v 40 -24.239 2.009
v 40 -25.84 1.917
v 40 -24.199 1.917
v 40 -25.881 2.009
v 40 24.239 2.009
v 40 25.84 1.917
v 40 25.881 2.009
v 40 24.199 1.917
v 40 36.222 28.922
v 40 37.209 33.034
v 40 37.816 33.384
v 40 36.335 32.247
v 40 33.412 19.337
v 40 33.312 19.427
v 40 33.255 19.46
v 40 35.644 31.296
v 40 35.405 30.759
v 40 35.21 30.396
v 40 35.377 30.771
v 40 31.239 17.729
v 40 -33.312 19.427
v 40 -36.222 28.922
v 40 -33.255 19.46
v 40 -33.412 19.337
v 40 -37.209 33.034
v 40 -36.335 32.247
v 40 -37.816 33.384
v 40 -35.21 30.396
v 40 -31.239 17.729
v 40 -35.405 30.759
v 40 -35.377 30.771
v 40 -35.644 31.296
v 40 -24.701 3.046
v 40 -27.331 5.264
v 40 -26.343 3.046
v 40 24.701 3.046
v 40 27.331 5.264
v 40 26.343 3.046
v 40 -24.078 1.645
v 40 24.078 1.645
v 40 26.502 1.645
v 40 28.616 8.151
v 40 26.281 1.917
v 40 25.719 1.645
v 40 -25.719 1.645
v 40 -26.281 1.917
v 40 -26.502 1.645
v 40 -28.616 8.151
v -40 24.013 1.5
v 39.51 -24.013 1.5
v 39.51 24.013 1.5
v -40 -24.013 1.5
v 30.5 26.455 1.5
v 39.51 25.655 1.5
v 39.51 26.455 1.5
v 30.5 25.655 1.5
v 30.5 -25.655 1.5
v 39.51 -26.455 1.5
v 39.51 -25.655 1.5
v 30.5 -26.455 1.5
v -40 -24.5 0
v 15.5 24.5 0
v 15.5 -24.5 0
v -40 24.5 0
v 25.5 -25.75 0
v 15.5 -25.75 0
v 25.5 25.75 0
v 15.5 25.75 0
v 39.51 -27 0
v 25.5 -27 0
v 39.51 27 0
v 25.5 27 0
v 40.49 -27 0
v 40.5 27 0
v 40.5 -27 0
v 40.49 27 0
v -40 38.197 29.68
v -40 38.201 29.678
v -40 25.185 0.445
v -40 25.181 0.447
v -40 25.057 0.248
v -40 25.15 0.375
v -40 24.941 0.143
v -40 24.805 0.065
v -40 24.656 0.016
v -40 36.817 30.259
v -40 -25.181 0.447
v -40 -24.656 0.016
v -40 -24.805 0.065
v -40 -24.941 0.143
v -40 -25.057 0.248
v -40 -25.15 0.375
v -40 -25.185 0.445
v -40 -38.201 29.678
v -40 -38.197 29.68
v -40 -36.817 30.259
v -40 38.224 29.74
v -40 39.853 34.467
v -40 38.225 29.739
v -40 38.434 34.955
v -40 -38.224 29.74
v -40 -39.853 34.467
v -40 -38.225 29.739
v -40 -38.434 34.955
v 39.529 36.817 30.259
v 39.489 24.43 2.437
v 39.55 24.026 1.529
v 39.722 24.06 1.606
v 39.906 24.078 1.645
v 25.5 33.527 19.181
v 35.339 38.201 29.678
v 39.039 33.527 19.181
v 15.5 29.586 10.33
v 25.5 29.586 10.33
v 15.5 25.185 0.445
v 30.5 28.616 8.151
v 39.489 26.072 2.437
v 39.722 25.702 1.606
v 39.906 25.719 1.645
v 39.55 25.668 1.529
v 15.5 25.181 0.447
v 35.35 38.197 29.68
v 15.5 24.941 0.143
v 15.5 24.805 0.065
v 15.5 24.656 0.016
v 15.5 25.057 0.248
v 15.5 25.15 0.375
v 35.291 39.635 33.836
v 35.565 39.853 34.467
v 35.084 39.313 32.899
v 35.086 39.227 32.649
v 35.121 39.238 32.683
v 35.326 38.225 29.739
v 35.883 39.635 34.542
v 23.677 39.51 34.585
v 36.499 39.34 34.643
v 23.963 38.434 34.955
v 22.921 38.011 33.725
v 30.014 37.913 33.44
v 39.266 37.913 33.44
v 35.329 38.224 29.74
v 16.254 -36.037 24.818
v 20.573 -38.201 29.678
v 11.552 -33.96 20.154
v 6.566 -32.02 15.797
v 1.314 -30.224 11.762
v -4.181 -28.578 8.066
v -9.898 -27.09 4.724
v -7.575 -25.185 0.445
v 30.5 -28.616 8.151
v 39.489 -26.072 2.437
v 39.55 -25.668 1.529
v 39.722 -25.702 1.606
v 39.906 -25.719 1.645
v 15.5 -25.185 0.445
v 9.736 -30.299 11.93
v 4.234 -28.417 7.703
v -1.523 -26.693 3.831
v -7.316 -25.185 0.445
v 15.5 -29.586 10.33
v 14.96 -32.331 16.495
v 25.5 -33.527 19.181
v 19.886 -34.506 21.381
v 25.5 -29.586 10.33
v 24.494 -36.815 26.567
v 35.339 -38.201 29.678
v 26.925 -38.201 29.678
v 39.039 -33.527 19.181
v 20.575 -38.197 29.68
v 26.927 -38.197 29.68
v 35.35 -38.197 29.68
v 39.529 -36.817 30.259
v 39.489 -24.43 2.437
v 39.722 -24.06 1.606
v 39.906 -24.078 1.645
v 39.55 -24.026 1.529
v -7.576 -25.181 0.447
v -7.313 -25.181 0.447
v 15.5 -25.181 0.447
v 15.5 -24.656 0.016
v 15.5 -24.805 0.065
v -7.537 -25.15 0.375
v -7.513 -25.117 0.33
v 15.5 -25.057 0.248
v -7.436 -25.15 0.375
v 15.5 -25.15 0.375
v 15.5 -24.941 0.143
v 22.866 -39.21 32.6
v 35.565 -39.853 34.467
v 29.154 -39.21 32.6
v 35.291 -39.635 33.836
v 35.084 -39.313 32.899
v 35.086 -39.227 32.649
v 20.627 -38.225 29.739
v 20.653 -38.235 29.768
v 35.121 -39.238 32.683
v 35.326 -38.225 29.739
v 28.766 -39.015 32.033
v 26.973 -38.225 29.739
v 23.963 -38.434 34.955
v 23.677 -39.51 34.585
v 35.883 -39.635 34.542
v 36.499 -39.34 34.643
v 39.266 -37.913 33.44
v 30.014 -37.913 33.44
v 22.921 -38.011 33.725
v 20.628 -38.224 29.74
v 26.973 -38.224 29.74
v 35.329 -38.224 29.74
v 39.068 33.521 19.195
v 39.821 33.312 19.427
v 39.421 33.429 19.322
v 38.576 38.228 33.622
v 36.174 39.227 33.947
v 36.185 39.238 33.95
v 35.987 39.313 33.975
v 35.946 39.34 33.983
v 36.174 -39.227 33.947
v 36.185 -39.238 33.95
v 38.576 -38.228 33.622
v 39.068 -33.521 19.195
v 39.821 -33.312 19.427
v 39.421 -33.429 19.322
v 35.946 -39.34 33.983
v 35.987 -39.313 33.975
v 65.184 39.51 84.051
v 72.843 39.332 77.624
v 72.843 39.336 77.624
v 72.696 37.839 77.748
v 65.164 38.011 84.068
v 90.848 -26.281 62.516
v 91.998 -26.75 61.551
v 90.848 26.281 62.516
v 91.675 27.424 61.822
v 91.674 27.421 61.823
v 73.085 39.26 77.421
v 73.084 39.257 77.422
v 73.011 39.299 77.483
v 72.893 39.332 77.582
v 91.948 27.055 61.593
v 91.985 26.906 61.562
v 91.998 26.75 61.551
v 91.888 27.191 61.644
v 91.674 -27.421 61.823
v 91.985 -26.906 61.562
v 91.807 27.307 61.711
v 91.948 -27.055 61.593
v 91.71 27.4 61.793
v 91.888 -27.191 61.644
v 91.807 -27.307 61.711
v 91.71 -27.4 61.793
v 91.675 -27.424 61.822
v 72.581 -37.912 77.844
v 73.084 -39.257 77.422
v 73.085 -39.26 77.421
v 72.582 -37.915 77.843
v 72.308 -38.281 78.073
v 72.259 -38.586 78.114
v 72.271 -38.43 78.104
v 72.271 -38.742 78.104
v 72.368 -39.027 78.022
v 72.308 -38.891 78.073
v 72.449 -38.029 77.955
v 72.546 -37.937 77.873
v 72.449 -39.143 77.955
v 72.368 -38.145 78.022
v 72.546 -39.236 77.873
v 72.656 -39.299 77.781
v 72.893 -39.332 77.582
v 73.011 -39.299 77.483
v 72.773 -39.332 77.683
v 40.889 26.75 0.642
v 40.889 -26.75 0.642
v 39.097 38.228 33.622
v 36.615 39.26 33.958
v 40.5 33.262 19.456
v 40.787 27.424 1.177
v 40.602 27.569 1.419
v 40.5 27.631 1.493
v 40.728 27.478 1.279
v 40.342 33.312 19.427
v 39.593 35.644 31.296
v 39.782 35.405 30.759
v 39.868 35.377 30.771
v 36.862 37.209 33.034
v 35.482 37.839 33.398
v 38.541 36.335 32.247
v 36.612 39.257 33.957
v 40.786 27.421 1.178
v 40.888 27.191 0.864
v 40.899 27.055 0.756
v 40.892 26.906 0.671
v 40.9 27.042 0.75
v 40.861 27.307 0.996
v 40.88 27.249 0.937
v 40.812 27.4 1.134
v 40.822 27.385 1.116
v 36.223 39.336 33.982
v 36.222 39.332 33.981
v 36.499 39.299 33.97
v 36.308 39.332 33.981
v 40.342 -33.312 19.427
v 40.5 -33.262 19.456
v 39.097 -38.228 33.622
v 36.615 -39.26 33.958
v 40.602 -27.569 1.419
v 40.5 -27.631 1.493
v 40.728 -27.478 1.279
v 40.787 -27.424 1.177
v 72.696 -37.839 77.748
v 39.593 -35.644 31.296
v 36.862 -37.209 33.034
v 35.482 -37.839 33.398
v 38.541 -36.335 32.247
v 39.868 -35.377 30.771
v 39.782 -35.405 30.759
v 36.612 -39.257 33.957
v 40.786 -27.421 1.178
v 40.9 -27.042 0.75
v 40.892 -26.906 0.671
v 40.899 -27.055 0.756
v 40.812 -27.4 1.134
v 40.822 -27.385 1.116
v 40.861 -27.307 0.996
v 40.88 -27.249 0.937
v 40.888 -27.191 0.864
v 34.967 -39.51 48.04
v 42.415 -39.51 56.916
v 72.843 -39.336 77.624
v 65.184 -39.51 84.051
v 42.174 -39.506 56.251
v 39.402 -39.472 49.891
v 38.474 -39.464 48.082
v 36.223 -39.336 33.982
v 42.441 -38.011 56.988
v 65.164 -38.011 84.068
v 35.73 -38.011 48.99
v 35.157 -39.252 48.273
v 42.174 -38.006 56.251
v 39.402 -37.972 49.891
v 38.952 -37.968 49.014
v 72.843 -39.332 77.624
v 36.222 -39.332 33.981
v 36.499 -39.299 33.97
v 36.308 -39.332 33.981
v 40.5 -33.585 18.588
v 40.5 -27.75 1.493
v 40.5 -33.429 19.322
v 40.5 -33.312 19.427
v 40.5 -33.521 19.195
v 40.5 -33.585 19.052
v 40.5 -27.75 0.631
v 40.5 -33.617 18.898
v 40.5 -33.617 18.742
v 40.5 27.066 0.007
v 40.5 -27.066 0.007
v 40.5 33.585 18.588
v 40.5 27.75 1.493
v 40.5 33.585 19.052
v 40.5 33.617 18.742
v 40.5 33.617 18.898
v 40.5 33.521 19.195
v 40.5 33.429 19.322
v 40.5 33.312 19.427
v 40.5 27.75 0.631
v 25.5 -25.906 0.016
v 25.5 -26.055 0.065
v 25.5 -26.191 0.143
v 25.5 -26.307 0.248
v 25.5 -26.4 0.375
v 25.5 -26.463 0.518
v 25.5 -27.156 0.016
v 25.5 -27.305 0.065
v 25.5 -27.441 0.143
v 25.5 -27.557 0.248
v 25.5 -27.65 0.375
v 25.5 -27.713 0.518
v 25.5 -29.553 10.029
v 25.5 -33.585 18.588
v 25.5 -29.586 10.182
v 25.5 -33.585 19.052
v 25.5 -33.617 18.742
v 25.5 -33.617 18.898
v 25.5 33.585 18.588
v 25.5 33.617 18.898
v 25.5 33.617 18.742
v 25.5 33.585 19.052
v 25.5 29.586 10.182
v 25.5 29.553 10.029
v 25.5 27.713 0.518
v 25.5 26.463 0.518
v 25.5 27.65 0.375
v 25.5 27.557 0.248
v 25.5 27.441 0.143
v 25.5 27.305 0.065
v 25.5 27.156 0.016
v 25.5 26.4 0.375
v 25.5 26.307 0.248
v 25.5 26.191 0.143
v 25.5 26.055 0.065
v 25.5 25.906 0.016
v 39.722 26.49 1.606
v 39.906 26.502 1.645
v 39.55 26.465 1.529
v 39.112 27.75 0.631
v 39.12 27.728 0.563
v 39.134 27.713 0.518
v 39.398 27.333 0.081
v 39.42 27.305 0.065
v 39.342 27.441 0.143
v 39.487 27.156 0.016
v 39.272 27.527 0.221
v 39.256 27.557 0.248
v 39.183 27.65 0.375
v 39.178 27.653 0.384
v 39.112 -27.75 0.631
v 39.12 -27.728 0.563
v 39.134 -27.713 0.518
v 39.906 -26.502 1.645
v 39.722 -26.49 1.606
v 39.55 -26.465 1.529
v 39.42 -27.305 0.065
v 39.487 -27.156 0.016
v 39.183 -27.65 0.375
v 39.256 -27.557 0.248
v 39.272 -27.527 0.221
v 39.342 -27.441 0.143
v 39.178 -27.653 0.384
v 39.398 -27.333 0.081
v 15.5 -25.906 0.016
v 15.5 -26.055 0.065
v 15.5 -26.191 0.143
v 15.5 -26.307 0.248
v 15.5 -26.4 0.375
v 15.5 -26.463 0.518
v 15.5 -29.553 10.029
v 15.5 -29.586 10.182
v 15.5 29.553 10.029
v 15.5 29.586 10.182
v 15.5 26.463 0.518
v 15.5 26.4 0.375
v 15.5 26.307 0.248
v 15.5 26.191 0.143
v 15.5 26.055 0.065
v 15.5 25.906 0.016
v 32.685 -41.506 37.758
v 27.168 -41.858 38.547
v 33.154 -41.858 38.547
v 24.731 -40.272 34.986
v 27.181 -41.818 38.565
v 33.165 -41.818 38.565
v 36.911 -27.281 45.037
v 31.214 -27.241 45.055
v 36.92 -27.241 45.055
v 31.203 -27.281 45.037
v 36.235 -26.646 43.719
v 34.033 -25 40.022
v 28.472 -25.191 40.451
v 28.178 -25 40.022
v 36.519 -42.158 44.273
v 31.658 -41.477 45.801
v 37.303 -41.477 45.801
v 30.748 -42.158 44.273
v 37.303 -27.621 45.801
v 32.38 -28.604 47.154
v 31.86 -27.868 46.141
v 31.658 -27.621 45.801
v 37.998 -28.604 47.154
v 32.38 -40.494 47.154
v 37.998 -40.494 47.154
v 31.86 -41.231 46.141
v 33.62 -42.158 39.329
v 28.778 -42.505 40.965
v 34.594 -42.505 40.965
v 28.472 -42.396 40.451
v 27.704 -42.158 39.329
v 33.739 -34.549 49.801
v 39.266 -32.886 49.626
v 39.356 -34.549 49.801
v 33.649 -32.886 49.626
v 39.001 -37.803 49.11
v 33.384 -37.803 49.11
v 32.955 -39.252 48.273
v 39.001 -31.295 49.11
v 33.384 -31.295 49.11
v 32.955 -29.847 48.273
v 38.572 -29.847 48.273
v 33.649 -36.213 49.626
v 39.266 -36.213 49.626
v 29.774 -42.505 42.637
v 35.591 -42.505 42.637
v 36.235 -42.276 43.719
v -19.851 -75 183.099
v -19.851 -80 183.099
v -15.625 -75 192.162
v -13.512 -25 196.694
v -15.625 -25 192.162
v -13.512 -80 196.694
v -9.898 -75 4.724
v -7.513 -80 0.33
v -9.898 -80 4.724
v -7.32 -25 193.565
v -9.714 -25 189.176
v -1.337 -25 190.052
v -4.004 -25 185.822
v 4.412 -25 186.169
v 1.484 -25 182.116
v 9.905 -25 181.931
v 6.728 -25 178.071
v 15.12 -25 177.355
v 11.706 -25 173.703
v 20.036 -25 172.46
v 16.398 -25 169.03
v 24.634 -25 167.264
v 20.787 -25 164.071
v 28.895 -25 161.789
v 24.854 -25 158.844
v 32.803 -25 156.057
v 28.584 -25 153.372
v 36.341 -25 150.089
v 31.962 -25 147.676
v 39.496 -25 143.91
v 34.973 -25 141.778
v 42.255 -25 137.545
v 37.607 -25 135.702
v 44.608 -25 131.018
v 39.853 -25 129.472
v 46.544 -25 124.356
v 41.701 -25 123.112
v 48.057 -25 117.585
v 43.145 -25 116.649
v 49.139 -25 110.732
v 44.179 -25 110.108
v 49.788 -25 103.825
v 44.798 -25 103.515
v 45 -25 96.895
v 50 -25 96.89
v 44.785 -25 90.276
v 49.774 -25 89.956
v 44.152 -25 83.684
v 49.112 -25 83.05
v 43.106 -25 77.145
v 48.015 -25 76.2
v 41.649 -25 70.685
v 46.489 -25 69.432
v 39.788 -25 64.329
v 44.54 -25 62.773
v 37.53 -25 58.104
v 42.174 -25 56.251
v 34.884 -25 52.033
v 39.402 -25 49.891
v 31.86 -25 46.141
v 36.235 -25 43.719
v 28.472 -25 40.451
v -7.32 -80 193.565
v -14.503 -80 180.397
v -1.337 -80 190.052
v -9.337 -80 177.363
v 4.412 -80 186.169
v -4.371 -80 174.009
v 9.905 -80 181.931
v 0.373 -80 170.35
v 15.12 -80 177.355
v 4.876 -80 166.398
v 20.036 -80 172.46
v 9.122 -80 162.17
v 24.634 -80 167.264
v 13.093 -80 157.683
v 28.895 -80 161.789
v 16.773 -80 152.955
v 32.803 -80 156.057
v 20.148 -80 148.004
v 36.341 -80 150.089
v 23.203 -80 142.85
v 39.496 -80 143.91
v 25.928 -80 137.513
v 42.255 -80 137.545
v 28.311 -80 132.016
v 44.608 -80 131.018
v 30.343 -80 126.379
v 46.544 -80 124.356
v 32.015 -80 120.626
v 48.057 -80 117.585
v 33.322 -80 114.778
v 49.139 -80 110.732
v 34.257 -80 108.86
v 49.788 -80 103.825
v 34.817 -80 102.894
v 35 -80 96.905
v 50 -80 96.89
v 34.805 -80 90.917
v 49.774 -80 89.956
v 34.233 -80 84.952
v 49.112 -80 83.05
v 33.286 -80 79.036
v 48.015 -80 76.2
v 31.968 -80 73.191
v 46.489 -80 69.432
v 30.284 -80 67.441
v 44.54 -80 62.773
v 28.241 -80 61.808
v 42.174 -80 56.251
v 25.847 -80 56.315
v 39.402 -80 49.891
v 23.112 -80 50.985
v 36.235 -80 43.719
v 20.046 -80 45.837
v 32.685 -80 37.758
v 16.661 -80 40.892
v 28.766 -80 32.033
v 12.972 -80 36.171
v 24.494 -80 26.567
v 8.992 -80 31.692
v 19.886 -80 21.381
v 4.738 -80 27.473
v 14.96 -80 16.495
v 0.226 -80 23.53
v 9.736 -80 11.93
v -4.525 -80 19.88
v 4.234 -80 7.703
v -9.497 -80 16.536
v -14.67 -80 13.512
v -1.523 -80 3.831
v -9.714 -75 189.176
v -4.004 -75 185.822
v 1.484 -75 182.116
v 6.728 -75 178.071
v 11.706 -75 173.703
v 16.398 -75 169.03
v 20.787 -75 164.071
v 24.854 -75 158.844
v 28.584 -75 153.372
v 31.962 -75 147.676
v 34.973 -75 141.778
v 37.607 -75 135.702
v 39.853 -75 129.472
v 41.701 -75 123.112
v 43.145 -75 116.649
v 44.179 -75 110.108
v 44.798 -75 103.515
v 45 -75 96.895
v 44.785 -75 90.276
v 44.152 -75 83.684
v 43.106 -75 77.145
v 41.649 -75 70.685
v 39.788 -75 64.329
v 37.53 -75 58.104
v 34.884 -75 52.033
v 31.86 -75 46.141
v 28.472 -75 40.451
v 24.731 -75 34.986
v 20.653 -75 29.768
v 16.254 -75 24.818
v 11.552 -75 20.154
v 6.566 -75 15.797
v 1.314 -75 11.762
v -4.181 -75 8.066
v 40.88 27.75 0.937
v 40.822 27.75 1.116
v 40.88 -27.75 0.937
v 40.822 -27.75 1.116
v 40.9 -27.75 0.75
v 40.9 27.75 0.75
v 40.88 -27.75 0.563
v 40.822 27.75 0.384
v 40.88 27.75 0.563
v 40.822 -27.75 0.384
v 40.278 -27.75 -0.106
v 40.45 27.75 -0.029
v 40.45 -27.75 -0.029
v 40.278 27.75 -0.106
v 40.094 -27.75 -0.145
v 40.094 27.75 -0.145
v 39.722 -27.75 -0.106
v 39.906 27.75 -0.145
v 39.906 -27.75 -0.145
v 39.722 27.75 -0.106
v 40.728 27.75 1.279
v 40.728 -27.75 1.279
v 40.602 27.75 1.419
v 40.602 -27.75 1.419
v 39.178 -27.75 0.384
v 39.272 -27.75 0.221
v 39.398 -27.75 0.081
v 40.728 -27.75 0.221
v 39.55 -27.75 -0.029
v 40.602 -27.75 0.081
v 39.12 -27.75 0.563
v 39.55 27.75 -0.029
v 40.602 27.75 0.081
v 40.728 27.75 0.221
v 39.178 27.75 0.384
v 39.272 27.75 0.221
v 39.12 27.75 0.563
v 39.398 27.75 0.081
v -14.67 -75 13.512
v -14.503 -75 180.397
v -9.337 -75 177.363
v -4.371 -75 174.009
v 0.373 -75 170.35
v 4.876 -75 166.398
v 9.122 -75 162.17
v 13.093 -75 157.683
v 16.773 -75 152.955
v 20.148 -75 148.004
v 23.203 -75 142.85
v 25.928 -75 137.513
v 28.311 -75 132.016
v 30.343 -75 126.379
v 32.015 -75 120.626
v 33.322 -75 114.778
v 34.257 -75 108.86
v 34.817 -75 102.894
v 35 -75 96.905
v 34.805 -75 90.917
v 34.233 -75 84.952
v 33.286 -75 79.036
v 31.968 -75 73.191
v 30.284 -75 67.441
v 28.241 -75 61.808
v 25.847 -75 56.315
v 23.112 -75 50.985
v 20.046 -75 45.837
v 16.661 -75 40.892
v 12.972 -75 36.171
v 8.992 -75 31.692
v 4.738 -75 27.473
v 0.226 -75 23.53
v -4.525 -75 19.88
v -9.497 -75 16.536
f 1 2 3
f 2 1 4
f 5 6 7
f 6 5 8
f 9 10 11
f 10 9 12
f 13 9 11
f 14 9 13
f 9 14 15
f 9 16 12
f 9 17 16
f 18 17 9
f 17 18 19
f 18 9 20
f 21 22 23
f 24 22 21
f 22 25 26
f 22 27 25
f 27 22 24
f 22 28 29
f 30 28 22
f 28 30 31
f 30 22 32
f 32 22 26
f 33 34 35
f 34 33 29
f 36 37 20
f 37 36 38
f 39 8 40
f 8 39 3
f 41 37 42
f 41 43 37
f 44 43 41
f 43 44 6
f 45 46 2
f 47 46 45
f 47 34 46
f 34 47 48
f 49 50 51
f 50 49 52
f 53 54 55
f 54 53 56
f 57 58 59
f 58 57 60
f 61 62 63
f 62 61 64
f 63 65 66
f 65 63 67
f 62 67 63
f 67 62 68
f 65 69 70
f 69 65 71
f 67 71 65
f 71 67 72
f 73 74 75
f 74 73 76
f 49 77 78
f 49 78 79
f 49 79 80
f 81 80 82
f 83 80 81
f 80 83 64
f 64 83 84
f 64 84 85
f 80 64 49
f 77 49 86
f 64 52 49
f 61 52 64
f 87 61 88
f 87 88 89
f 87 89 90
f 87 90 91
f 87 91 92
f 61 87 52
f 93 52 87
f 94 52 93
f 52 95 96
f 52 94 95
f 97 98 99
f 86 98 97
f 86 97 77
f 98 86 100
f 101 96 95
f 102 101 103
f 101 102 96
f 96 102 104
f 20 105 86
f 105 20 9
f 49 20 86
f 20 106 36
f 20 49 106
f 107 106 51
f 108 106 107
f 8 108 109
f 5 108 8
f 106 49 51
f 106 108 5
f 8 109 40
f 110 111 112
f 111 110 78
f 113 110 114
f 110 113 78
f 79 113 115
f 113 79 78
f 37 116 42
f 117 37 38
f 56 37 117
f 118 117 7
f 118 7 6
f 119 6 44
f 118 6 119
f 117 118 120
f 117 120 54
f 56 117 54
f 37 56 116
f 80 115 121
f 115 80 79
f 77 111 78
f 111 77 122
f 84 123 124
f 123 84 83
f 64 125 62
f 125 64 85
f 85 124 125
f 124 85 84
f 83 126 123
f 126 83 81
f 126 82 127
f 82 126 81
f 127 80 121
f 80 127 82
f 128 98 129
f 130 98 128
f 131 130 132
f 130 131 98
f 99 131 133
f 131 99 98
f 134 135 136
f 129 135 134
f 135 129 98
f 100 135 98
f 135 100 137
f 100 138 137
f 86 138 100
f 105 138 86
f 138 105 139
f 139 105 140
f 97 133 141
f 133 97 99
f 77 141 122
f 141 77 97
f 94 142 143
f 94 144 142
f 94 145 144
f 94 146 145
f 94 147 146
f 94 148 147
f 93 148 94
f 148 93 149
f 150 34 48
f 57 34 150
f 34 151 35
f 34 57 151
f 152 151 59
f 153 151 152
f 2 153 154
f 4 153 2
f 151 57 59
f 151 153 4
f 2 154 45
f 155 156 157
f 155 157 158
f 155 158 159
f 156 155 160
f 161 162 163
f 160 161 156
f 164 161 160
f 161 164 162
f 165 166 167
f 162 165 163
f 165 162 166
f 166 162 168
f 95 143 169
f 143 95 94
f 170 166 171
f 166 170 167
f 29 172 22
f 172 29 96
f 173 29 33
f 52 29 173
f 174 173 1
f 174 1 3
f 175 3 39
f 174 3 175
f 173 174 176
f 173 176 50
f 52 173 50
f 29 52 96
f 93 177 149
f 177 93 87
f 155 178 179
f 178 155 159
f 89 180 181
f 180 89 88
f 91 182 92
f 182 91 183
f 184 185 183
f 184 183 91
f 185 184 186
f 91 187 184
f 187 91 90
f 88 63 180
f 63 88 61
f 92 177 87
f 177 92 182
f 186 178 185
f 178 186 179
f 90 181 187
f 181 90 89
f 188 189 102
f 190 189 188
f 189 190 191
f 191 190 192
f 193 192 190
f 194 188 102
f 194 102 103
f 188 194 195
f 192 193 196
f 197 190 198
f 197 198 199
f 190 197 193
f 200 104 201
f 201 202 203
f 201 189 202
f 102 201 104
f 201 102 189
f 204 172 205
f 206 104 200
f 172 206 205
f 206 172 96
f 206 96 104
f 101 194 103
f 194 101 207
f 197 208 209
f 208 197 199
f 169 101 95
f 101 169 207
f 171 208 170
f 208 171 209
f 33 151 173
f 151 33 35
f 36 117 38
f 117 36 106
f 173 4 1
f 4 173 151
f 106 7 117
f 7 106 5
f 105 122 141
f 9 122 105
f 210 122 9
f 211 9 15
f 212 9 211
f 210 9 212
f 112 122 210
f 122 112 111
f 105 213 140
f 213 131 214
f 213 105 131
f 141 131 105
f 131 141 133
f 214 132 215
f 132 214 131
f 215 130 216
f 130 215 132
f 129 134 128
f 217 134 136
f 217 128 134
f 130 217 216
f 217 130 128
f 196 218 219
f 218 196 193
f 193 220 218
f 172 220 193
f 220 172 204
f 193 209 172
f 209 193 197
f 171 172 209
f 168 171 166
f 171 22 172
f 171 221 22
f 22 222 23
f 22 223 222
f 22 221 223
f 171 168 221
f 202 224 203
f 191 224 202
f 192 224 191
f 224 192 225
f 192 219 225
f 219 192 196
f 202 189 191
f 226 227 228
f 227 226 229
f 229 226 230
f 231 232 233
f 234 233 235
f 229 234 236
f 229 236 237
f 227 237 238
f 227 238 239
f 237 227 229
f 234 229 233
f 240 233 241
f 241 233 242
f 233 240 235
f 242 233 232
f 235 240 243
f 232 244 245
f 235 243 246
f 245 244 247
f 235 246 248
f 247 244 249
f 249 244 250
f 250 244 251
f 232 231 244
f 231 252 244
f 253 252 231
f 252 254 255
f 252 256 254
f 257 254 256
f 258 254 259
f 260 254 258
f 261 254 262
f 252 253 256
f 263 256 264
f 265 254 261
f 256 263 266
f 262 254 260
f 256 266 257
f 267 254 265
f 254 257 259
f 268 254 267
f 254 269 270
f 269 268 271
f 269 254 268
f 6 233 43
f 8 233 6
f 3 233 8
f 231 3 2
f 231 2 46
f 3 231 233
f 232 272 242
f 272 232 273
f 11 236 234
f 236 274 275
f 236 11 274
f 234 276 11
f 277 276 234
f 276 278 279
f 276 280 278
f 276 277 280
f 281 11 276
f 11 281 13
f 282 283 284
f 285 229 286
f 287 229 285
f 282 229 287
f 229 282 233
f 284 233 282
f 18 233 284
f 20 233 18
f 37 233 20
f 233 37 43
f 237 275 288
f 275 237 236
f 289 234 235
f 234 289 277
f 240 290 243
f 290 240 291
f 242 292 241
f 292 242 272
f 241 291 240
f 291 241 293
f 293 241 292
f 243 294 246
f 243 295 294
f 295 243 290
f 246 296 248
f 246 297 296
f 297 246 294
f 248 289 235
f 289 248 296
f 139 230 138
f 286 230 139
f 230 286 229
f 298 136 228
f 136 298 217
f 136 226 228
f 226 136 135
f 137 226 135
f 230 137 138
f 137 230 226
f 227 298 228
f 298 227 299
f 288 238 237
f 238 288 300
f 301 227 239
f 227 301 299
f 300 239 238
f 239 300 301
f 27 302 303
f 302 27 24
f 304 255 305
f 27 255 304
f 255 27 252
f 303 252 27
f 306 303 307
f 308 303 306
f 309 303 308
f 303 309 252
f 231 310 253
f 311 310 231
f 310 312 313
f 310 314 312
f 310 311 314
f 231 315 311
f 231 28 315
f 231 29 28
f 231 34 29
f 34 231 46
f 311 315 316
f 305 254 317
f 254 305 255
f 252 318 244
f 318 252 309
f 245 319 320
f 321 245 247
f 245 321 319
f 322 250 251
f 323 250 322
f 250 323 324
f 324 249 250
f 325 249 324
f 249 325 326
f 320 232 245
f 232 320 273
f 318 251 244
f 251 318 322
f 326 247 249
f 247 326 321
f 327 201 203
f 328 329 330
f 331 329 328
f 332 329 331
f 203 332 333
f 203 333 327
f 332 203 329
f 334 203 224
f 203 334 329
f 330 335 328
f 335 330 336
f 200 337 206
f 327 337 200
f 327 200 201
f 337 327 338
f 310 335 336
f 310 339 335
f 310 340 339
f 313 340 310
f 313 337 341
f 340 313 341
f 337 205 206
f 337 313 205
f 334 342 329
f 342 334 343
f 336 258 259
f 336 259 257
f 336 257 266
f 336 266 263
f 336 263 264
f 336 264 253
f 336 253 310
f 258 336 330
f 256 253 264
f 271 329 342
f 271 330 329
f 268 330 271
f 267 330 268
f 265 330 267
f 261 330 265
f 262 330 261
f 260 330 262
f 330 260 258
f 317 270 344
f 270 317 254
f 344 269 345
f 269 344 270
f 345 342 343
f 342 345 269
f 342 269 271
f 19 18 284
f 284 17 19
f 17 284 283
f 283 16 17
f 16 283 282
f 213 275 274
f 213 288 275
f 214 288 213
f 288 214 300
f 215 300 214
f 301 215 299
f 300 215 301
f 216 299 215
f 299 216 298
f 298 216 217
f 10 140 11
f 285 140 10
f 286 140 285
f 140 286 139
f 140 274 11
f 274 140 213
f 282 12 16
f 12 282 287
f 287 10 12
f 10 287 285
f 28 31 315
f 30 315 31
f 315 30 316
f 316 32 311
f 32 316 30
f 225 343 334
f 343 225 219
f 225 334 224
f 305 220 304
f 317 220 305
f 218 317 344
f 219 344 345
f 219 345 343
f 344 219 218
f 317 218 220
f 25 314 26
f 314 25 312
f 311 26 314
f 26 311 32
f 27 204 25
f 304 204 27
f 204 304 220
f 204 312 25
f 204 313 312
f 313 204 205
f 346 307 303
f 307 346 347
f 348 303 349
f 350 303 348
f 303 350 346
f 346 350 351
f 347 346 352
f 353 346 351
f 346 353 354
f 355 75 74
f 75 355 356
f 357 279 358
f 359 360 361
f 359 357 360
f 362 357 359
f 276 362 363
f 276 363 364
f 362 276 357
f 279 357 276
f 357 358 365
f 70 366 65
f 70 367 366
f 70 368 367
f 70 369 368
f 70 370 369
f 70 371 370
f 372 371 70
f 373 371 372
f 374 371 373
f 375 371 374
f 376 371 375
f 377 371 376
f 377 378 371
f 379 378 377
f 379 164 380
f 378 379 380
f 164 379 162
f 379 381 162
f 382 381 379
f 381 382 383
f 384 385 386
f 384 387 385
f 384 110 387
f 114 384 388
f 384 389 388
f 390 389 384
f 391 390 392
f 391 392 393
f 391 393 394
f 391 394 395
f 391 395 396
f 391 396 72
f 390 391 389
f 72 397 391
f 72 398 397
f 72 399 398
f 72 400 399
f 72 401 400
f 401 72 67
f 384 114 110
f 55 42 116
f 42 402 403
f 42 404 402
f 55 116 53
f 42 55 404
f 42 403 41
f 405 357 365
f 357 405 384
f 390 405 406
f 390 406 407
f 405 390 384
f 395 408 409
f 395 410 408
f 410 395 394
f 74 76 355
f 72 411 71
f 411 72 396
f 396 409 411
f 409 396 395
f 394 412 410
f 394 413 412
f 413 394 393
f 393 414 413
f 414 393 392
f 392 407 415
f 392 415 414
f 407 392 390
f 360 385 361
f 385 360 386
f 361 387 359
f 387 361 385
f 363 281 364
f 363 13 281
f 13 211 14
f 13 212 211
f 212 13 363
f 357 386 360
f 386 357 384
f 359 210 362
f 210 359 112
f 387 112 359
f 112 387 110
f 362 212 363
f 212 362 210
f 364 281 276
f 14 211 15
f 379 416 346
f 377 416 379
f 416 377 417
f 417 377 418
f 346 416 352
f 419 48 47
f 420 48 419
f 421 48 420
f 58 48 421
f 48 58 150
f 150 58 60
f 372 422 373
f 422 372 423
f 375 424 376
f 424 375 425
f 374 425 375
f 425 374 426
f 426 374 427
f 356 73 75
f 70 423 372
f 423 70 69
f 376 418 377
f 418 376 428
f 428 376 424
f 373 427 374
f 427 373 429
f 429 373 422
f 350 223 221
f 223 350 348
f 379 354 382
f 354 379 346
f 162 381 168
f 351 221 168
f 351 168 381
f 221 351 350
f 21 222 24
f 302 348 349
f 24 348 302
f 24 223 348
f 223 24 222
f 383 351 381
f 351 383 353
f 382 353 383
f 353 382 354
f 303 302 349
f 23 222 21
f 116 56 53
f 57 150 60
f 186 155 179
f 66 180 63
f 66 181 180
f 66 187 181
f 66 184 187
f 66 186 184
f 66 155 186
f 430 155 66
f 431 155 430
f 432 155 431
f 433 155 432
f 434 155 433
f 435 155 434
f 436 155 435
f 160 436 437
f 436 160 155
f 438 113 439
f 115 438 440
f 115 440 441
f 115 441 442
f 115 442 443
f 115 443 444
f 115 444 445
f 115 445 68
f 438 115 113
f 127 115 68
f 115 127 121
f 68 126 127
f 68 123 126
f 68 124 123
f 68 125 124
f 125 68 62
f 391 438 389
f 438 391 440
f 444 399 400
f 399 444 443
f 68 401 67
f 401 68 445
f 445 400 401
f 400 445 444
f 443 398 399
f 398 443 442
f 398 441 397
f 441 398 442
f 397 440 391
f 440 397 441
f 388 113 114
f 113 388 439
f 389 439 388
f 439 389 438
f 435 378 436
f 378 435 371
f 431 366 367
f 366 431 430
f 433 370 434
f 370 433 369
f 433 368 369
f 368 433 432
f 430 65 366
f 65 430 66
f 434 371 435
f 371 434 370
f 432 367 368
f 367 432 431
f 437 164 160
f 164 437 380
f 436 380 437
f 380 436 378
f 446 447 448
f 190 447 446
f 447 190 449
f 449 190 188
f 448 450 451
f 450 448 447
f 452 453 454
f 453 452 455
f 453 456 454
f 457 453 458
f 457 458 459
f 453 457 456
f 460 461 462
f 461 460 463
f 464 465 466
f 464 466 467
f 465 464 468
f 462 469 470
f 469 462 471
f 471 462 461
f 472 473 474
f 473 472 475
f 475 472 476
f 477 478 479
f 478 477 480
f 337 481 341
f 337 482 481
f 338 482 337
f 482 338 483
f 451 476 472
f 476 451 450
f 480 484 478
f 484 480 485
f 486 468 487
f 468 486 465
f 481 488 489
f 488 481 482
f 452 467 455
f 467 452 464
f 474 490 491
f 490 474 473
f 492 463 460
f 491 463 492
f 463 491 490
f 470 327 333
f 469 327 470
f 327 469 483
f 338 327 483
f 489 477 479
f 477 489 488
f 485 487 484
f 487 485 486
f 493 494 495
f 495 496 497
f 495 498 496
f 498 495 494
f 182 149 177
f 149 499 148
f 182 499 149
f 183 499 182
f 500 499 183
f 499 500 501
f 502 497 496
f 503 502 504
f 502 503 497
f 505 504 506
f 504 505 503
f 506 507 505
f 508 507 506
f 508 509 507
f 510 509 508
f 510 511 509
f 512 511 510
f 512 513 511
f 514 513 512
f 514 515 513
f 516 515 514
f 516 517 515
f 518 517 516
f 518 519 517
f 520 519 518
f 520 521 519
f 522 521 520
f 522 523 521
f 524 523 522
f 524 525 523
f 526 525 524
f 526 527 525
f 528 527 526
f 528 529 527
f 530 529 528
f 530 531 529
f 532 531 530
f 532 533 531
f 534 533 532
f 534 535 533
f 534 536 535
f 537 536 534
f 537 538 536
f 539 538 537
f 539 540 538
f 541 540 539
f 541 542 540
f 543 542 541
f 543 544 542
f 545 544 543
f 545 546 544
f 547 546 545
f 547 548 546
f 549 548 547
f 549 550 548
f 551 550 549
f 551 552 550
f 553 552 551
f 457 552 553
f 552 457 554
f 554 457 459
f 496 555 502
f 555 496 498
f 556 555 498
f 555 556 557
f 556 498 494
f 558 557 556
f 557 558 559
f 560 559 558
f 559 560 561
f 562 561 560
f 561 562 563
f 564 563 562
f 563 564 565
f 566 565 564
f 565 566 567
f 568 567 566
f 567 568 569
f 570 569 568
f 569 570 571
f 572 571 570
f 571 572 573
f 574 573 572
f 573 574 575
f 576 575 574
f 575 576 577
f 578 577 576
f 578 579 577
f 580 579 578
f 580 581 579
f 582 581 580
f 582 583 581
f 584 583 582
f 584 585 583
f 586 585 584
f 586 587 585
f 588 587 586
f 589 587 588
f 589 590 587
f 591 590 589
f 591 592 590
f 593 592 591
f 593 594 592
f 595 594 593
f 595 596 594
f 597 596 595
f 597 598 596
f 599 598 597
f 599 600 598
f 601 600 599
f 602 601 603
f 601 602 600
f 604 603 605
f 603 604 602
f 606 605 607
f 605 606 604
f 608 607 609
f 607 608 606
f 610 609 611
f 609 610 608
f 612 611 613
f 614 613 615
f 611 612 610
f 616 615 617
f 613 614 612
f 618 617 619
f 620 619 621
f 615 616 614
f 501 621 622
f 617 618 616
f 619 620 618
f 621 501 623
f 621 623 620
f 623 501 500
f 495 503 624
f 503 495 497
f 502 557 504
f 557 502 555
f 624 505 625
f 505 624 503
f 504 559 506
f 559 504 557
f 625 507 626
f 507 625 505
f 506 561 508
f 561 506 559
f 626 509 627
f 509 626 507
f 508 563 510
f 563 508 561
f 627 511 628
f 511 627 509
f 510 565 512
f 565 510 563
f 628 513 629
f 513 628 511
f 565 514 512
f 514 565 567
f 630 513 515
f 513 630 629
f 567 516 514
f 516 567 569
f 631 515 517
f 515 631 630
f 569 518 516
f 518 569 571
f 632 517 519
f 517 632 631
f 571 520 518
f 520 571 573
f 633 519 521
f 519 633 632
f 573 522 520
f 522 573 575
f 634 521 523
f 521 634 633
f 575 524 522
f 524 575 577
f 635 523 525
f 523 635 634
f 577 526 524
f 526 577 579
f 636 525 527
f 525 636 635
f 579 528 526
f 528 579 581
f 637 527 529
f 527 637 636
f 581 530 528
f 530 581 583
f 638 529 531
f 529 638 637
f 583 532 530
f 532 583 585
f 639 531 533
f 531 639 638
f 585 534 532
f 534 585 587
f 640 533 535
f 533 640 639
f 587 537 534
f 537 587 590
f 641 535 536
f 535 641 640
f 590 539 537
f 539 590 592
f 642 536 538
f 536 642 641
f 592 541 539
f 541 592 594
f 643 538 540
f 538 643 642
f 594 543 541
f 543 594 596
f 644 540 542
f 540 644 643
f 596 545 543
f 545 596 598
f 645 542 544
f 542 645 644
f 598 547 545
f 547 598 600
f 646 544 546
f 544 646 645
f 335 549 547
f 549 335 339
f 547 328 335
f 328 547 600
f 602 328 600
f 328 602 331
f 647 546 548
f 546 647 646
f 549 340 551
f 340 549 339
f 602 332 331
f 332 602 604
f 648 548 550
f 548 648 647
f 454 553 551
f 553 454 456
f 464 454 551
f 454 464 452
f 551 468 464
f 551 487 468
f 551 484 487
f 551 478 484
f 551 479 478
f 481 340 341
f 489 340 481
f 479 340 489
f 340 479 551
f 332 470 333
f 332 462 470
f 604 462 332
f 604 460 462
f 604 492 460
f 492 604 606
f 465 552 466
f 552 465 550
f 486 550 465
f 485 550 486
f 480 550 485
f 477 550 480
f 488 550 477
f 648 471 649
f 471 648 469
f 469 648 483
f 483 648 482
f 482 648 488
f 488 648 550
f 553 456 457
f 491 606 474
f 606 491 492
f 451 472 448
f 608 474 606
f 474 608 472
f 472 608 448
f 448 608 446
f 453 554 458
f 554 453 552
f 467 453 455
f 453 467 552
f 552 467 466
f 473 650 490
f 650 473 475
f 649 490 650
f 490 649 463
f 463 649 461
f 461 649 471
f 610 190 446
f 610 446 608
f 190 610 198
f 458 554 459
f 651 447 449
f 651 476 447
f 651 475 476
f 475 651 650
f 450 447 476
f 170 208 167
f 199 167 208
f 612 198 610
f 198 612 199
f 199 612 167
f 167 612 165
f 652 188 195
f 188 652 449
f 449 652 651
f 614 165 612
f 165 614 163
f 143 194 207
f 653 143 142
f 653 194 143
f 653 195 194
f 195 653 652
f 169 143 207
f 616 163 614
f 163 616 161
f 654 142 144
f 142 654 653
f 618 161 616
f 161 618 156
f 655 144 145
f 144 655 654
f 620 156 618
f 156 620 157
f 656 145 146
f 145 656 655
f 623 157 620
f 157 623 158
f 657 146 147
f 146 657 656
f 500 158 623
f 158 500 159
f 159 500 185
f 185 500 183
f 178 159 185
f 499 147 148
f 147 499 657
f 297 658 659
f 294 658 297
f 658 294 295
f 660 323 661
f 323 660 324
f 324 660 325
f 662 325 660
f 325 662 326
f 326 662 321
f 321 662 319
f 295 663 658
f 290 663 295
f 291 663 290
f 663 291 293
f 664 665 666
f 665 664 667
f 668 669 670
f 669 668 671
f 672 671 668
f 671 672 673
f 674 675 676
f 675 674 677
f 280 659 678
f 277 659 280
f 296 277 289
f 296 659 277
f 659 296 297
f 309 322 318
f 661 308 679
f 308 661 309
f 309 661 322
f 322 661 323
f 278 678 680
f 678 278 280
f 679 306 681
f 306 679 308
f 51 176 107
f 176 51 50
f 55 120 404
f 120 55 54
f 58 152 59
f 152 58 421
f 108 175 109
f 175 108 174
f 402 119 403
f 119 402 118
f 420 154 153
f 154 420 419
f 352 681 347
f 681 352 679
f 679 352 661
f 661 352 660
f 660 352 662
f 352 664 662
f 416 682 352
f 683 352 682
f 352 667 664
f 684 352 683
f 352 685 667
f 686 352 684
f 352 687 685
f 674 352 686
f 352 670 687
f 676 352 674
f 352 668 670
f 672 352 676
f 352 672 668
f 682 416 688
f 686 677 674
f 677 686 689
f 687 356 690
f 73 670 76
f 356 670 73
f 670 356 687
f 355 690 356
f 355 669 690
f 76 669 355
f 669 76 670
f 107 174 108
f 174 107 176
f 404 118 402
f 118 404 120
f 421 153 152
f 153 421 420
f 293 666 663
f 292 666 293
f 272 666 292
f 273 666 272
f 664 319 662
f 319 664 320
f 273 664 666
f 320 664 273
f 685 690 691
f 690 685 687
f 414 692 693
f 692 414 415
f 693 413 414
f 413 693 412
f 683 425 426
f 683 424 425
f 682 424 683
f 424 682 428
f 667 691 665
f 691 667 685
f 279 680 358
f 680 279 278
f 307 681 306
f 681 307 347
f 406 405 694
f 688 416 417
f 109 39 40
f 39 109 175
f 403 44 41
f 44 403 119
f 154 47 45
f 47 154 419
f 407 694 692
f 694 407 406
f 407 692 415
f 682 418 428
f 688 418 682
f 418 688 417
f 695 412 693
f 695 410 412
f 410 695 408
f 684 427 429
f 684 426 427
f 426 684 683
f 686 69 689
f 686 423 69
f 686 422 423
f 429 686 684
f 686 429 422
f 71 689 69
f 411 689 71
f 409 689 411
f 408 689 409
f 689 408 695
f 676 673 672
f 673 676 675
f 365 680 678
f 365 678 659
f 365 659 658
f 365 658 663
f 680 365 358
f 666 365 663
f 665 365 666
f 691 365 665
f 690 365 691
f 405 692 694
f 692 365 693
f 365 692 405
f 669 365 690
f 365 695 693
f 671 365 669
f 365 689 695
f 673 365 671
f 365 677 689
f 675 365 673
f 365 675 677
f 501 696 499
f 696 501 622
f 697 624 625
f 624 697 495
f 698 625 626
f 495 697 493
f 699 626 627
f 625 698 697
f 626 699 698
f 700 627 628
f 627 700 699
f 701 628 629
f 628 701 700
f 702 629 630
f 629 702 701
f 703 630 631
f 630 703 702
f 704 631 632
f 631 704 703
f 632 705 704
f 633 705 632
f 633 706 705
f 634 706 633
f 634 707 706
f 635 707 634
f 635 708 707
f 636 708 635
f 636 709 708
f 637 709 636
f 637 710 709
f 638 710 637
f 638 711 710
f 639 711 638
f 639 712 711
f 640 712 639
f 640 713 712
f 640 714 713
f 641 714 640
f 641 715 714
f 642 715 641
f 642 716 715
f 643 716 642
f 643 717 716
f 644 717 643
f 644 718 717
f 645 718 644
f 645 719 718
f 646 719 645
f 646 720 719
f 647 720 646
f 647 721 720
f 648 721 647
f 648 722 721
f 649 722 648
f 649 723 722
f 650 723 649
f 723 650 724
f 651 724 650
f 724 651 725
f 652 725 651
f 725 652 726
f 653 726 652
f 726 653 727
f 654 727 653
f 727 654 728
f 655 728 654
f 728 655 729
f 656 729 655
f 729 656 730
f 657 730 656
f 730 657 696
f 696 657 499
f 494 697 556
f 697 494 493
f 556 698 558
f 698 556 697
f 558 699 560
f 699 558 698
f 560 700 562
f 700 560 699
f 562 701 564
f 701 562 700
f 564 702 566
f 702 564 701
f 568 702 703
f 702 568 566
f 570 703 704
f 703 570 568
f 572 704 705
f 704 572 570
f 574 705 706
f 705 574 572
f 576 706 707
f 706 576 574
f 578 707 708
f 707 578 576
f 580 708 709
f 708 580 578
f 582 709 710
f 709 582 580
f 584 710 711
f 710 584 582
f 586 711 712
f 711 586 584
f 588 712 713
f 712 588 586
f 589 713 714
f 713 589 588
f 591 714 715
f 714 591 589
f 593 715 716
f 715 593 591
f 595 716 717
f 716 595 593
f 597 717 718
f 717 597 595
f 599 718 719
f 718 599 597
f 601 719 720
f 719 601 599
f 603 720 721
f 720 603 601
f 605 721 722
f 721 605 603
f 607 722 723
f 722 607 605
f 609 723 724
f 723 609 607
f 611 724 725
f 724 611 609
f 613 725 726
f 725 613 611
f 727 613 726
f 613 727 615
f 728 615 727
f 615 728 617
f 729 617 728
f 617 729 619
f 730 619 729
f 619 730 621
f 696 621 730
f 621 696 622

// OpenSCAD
$fn=30;
//$thickness = 1;
//sphere(3);

module ushape (length,width,angle,sidelength,thickness,hooklength,hookangle) {
  cube([length,width,thickness],center=true);
  // Sidewall 1
  translate([-(length/2),(width/2),0]) {
    rotate(a=angle , v = [1,0,0]) {
      translate ([0,0,-thickness/2]) { 
        cube([length,sidelength,thickness]);
      }
    }
  }
  // Edge smooth1
  translate ([0,(width/2),0]) { 
    rotate (a=90,v=[0,1,0]) {
      cylinder(h=length,center=true,d=thickness);
    }
  }
  // Hook 1
  translate([-(length/2),width/2+sidelength*(cos(angle)),sidelength*sin(angle)]) {
    rotate(a=angle+hookangle, v = [1,0,0]) {
      translate ([0,0,-thickness/2]) { 
        cube([length,hooklength,thickness]);
      }
    }
  }
  // Hook 1 smooth 
  translate ([0,(width/2)+sidelength*(cos(angle)),sidelength*sin(angle)]) { 
    rotate (a=90,v=[0,1,0]) {
      cylinder(h=length,center=true,d=thickness);
    }
  }
  // Sidewall 2 
  translate([-(length/2),-(width/2),0]) {
    rotate(a=180-angle , v = [1,0,0]) {
      translate ([0,0,-thickness/2]) { 
        cube([length,sidelength,thickness]);
      }
    }
  }
  // Edge smooth 2 
  translate ([0,-(width/2),0]) { 
    rotate (a=90,v=[0,1,0]) {
      cylinder(h=length,center=true,d=thickness);
    }
  }
  // Hook 2
  translate([-(length/2),-width/2-sidelength*(cos(angle)),sidelength*sin(angle)]) {
    rotate(a=180-(angle+hookangle), v = [1,0,0]) {
      translate ([0,0,-thickness/2]) { 
        cube([length,hooklength,thickness]);
      }
    }
  }
  // Hook 2 smooth 
  translate ([0,-(width/2)-sidelength*(cos(angle)),sidelength*sin(angle)]) { 
    rotate (a=90,v=[0,1,0]) {
      cylinder(h=length,center=true,d=thickness);
    }
  }
}

// Params
// length = length of base plate along x axis
// width  = width of base plate along y axis
// angle  = angle of sidewalls from y axis and left 
// sidelength = length of the two sides of the U-profile
// hooklength = length of the hook at the end of the sides
// hookangle = angle of hook relative to sidewalls 

// Prøveprint 1 
// Ramma
//ushape(10,51,80,49,1,2,90);

//translate([5,0,0,]) {
//rotate (a=20, v=[0,1,0]) { 
//  translate ([5,0,0]) { 
    // Motorskjold
//    ushape(10,58,64,40,1,0,90);
//  }
//}
//}

base_length=80;
front_length=80;
base_sidewall_angle=66;
front_sidewall_angle=64;
up_angle=50;
base_width=49;
front_width=53.5;
base_wall_height=32;
front_wall_height=27;
thickness=1.5;

  difference() {
      translate ([0,0,thickness/2]) {  
      ushape(base_length,base_width,base_sidewall_angle,base_wall_height,thickness,5,5);
    }

    translate ([front_length/2+thickness,0,thickness/2]) {  
       rotate(a=-up_angle, v=[0,1,0]) {
         translate([front_length/2,0,0]) {
           ushape(front_length,front_width+(4*thickness),front_sidewall_angle,front_wall_height,thickness*3.5,0,0);
         } 
       }
     }
     
  }

  difference() { 
    translate ([base_length/2,0,thickness/2]) {  
      rotate(a=-up_angle, v=[0,1,0]) {
        translate([front_length/2,0,0]) {
          ushape(front_length,front_width,front_sidewall_angle,front_wall_height,thickness,10,25);
        } 
      }
    }
    translate ([0,0,thickness/2-thickness]) {  
      ushape(base_length,base_width+(4*thickness),base_sidewall_angle,base_wall_height,thickness*7.5,0,90);
     }
  }
  
  translate ([base_length/2,0,thickness/2]) { 
    rotate (a=90,v=[1,0,0]) {
      cylinder(h=front_width+2,center=true,d=thickness*1.2);
    }
  }
  
  // Filling holes 
    translate ([base_length/2-7,0,thickness/2]) {  
      ushape(15,base_width+5,72,base_wall_height-13,thickness,0,50);
    }
    translate ([base_length/2-17,0,thickness/2]) {  
      ushape(15,base_width+2.5,72,base_wall_height-22,thickness,0,50);
    }
//    translate ([base_length/2-2,0,thickness/2]) {  
//      ushape(5,base_width,64,base_wall_height-25,thickness,0,50);
//    }

//uknekk(sidewall_angle,up_angle,baselength,frontlength,base_width,32,1.5);
difference() {
  translate([-60,-25,97]) {
  rotate(a=-65,v=[0,1,0]) {
    rotate(a=90,v=[1,0,0]) {    
      rotate_extrude(angle=-126.5,$fn=100) {
        translate([105,0,0]) {
          square([5,55]);
        }
      }
    }
  }
  }
  translate ([0,0,8]) {
    ushape(base_length,base_width-10,base_sidewall_angle,base_wall_height+5,16,0,90);
  }
}

 translate([-60,-75,97]) {
  rotate(a=-65,v=[0,1,0]) {
    rotate(a=90,v=[1,0,0]) {    
      rotate_extrude(angle=-126.5,$fn=100) {
        translate([95,0,0]) {
          square([10,5]);
        }
      }
    }
  }
  }
